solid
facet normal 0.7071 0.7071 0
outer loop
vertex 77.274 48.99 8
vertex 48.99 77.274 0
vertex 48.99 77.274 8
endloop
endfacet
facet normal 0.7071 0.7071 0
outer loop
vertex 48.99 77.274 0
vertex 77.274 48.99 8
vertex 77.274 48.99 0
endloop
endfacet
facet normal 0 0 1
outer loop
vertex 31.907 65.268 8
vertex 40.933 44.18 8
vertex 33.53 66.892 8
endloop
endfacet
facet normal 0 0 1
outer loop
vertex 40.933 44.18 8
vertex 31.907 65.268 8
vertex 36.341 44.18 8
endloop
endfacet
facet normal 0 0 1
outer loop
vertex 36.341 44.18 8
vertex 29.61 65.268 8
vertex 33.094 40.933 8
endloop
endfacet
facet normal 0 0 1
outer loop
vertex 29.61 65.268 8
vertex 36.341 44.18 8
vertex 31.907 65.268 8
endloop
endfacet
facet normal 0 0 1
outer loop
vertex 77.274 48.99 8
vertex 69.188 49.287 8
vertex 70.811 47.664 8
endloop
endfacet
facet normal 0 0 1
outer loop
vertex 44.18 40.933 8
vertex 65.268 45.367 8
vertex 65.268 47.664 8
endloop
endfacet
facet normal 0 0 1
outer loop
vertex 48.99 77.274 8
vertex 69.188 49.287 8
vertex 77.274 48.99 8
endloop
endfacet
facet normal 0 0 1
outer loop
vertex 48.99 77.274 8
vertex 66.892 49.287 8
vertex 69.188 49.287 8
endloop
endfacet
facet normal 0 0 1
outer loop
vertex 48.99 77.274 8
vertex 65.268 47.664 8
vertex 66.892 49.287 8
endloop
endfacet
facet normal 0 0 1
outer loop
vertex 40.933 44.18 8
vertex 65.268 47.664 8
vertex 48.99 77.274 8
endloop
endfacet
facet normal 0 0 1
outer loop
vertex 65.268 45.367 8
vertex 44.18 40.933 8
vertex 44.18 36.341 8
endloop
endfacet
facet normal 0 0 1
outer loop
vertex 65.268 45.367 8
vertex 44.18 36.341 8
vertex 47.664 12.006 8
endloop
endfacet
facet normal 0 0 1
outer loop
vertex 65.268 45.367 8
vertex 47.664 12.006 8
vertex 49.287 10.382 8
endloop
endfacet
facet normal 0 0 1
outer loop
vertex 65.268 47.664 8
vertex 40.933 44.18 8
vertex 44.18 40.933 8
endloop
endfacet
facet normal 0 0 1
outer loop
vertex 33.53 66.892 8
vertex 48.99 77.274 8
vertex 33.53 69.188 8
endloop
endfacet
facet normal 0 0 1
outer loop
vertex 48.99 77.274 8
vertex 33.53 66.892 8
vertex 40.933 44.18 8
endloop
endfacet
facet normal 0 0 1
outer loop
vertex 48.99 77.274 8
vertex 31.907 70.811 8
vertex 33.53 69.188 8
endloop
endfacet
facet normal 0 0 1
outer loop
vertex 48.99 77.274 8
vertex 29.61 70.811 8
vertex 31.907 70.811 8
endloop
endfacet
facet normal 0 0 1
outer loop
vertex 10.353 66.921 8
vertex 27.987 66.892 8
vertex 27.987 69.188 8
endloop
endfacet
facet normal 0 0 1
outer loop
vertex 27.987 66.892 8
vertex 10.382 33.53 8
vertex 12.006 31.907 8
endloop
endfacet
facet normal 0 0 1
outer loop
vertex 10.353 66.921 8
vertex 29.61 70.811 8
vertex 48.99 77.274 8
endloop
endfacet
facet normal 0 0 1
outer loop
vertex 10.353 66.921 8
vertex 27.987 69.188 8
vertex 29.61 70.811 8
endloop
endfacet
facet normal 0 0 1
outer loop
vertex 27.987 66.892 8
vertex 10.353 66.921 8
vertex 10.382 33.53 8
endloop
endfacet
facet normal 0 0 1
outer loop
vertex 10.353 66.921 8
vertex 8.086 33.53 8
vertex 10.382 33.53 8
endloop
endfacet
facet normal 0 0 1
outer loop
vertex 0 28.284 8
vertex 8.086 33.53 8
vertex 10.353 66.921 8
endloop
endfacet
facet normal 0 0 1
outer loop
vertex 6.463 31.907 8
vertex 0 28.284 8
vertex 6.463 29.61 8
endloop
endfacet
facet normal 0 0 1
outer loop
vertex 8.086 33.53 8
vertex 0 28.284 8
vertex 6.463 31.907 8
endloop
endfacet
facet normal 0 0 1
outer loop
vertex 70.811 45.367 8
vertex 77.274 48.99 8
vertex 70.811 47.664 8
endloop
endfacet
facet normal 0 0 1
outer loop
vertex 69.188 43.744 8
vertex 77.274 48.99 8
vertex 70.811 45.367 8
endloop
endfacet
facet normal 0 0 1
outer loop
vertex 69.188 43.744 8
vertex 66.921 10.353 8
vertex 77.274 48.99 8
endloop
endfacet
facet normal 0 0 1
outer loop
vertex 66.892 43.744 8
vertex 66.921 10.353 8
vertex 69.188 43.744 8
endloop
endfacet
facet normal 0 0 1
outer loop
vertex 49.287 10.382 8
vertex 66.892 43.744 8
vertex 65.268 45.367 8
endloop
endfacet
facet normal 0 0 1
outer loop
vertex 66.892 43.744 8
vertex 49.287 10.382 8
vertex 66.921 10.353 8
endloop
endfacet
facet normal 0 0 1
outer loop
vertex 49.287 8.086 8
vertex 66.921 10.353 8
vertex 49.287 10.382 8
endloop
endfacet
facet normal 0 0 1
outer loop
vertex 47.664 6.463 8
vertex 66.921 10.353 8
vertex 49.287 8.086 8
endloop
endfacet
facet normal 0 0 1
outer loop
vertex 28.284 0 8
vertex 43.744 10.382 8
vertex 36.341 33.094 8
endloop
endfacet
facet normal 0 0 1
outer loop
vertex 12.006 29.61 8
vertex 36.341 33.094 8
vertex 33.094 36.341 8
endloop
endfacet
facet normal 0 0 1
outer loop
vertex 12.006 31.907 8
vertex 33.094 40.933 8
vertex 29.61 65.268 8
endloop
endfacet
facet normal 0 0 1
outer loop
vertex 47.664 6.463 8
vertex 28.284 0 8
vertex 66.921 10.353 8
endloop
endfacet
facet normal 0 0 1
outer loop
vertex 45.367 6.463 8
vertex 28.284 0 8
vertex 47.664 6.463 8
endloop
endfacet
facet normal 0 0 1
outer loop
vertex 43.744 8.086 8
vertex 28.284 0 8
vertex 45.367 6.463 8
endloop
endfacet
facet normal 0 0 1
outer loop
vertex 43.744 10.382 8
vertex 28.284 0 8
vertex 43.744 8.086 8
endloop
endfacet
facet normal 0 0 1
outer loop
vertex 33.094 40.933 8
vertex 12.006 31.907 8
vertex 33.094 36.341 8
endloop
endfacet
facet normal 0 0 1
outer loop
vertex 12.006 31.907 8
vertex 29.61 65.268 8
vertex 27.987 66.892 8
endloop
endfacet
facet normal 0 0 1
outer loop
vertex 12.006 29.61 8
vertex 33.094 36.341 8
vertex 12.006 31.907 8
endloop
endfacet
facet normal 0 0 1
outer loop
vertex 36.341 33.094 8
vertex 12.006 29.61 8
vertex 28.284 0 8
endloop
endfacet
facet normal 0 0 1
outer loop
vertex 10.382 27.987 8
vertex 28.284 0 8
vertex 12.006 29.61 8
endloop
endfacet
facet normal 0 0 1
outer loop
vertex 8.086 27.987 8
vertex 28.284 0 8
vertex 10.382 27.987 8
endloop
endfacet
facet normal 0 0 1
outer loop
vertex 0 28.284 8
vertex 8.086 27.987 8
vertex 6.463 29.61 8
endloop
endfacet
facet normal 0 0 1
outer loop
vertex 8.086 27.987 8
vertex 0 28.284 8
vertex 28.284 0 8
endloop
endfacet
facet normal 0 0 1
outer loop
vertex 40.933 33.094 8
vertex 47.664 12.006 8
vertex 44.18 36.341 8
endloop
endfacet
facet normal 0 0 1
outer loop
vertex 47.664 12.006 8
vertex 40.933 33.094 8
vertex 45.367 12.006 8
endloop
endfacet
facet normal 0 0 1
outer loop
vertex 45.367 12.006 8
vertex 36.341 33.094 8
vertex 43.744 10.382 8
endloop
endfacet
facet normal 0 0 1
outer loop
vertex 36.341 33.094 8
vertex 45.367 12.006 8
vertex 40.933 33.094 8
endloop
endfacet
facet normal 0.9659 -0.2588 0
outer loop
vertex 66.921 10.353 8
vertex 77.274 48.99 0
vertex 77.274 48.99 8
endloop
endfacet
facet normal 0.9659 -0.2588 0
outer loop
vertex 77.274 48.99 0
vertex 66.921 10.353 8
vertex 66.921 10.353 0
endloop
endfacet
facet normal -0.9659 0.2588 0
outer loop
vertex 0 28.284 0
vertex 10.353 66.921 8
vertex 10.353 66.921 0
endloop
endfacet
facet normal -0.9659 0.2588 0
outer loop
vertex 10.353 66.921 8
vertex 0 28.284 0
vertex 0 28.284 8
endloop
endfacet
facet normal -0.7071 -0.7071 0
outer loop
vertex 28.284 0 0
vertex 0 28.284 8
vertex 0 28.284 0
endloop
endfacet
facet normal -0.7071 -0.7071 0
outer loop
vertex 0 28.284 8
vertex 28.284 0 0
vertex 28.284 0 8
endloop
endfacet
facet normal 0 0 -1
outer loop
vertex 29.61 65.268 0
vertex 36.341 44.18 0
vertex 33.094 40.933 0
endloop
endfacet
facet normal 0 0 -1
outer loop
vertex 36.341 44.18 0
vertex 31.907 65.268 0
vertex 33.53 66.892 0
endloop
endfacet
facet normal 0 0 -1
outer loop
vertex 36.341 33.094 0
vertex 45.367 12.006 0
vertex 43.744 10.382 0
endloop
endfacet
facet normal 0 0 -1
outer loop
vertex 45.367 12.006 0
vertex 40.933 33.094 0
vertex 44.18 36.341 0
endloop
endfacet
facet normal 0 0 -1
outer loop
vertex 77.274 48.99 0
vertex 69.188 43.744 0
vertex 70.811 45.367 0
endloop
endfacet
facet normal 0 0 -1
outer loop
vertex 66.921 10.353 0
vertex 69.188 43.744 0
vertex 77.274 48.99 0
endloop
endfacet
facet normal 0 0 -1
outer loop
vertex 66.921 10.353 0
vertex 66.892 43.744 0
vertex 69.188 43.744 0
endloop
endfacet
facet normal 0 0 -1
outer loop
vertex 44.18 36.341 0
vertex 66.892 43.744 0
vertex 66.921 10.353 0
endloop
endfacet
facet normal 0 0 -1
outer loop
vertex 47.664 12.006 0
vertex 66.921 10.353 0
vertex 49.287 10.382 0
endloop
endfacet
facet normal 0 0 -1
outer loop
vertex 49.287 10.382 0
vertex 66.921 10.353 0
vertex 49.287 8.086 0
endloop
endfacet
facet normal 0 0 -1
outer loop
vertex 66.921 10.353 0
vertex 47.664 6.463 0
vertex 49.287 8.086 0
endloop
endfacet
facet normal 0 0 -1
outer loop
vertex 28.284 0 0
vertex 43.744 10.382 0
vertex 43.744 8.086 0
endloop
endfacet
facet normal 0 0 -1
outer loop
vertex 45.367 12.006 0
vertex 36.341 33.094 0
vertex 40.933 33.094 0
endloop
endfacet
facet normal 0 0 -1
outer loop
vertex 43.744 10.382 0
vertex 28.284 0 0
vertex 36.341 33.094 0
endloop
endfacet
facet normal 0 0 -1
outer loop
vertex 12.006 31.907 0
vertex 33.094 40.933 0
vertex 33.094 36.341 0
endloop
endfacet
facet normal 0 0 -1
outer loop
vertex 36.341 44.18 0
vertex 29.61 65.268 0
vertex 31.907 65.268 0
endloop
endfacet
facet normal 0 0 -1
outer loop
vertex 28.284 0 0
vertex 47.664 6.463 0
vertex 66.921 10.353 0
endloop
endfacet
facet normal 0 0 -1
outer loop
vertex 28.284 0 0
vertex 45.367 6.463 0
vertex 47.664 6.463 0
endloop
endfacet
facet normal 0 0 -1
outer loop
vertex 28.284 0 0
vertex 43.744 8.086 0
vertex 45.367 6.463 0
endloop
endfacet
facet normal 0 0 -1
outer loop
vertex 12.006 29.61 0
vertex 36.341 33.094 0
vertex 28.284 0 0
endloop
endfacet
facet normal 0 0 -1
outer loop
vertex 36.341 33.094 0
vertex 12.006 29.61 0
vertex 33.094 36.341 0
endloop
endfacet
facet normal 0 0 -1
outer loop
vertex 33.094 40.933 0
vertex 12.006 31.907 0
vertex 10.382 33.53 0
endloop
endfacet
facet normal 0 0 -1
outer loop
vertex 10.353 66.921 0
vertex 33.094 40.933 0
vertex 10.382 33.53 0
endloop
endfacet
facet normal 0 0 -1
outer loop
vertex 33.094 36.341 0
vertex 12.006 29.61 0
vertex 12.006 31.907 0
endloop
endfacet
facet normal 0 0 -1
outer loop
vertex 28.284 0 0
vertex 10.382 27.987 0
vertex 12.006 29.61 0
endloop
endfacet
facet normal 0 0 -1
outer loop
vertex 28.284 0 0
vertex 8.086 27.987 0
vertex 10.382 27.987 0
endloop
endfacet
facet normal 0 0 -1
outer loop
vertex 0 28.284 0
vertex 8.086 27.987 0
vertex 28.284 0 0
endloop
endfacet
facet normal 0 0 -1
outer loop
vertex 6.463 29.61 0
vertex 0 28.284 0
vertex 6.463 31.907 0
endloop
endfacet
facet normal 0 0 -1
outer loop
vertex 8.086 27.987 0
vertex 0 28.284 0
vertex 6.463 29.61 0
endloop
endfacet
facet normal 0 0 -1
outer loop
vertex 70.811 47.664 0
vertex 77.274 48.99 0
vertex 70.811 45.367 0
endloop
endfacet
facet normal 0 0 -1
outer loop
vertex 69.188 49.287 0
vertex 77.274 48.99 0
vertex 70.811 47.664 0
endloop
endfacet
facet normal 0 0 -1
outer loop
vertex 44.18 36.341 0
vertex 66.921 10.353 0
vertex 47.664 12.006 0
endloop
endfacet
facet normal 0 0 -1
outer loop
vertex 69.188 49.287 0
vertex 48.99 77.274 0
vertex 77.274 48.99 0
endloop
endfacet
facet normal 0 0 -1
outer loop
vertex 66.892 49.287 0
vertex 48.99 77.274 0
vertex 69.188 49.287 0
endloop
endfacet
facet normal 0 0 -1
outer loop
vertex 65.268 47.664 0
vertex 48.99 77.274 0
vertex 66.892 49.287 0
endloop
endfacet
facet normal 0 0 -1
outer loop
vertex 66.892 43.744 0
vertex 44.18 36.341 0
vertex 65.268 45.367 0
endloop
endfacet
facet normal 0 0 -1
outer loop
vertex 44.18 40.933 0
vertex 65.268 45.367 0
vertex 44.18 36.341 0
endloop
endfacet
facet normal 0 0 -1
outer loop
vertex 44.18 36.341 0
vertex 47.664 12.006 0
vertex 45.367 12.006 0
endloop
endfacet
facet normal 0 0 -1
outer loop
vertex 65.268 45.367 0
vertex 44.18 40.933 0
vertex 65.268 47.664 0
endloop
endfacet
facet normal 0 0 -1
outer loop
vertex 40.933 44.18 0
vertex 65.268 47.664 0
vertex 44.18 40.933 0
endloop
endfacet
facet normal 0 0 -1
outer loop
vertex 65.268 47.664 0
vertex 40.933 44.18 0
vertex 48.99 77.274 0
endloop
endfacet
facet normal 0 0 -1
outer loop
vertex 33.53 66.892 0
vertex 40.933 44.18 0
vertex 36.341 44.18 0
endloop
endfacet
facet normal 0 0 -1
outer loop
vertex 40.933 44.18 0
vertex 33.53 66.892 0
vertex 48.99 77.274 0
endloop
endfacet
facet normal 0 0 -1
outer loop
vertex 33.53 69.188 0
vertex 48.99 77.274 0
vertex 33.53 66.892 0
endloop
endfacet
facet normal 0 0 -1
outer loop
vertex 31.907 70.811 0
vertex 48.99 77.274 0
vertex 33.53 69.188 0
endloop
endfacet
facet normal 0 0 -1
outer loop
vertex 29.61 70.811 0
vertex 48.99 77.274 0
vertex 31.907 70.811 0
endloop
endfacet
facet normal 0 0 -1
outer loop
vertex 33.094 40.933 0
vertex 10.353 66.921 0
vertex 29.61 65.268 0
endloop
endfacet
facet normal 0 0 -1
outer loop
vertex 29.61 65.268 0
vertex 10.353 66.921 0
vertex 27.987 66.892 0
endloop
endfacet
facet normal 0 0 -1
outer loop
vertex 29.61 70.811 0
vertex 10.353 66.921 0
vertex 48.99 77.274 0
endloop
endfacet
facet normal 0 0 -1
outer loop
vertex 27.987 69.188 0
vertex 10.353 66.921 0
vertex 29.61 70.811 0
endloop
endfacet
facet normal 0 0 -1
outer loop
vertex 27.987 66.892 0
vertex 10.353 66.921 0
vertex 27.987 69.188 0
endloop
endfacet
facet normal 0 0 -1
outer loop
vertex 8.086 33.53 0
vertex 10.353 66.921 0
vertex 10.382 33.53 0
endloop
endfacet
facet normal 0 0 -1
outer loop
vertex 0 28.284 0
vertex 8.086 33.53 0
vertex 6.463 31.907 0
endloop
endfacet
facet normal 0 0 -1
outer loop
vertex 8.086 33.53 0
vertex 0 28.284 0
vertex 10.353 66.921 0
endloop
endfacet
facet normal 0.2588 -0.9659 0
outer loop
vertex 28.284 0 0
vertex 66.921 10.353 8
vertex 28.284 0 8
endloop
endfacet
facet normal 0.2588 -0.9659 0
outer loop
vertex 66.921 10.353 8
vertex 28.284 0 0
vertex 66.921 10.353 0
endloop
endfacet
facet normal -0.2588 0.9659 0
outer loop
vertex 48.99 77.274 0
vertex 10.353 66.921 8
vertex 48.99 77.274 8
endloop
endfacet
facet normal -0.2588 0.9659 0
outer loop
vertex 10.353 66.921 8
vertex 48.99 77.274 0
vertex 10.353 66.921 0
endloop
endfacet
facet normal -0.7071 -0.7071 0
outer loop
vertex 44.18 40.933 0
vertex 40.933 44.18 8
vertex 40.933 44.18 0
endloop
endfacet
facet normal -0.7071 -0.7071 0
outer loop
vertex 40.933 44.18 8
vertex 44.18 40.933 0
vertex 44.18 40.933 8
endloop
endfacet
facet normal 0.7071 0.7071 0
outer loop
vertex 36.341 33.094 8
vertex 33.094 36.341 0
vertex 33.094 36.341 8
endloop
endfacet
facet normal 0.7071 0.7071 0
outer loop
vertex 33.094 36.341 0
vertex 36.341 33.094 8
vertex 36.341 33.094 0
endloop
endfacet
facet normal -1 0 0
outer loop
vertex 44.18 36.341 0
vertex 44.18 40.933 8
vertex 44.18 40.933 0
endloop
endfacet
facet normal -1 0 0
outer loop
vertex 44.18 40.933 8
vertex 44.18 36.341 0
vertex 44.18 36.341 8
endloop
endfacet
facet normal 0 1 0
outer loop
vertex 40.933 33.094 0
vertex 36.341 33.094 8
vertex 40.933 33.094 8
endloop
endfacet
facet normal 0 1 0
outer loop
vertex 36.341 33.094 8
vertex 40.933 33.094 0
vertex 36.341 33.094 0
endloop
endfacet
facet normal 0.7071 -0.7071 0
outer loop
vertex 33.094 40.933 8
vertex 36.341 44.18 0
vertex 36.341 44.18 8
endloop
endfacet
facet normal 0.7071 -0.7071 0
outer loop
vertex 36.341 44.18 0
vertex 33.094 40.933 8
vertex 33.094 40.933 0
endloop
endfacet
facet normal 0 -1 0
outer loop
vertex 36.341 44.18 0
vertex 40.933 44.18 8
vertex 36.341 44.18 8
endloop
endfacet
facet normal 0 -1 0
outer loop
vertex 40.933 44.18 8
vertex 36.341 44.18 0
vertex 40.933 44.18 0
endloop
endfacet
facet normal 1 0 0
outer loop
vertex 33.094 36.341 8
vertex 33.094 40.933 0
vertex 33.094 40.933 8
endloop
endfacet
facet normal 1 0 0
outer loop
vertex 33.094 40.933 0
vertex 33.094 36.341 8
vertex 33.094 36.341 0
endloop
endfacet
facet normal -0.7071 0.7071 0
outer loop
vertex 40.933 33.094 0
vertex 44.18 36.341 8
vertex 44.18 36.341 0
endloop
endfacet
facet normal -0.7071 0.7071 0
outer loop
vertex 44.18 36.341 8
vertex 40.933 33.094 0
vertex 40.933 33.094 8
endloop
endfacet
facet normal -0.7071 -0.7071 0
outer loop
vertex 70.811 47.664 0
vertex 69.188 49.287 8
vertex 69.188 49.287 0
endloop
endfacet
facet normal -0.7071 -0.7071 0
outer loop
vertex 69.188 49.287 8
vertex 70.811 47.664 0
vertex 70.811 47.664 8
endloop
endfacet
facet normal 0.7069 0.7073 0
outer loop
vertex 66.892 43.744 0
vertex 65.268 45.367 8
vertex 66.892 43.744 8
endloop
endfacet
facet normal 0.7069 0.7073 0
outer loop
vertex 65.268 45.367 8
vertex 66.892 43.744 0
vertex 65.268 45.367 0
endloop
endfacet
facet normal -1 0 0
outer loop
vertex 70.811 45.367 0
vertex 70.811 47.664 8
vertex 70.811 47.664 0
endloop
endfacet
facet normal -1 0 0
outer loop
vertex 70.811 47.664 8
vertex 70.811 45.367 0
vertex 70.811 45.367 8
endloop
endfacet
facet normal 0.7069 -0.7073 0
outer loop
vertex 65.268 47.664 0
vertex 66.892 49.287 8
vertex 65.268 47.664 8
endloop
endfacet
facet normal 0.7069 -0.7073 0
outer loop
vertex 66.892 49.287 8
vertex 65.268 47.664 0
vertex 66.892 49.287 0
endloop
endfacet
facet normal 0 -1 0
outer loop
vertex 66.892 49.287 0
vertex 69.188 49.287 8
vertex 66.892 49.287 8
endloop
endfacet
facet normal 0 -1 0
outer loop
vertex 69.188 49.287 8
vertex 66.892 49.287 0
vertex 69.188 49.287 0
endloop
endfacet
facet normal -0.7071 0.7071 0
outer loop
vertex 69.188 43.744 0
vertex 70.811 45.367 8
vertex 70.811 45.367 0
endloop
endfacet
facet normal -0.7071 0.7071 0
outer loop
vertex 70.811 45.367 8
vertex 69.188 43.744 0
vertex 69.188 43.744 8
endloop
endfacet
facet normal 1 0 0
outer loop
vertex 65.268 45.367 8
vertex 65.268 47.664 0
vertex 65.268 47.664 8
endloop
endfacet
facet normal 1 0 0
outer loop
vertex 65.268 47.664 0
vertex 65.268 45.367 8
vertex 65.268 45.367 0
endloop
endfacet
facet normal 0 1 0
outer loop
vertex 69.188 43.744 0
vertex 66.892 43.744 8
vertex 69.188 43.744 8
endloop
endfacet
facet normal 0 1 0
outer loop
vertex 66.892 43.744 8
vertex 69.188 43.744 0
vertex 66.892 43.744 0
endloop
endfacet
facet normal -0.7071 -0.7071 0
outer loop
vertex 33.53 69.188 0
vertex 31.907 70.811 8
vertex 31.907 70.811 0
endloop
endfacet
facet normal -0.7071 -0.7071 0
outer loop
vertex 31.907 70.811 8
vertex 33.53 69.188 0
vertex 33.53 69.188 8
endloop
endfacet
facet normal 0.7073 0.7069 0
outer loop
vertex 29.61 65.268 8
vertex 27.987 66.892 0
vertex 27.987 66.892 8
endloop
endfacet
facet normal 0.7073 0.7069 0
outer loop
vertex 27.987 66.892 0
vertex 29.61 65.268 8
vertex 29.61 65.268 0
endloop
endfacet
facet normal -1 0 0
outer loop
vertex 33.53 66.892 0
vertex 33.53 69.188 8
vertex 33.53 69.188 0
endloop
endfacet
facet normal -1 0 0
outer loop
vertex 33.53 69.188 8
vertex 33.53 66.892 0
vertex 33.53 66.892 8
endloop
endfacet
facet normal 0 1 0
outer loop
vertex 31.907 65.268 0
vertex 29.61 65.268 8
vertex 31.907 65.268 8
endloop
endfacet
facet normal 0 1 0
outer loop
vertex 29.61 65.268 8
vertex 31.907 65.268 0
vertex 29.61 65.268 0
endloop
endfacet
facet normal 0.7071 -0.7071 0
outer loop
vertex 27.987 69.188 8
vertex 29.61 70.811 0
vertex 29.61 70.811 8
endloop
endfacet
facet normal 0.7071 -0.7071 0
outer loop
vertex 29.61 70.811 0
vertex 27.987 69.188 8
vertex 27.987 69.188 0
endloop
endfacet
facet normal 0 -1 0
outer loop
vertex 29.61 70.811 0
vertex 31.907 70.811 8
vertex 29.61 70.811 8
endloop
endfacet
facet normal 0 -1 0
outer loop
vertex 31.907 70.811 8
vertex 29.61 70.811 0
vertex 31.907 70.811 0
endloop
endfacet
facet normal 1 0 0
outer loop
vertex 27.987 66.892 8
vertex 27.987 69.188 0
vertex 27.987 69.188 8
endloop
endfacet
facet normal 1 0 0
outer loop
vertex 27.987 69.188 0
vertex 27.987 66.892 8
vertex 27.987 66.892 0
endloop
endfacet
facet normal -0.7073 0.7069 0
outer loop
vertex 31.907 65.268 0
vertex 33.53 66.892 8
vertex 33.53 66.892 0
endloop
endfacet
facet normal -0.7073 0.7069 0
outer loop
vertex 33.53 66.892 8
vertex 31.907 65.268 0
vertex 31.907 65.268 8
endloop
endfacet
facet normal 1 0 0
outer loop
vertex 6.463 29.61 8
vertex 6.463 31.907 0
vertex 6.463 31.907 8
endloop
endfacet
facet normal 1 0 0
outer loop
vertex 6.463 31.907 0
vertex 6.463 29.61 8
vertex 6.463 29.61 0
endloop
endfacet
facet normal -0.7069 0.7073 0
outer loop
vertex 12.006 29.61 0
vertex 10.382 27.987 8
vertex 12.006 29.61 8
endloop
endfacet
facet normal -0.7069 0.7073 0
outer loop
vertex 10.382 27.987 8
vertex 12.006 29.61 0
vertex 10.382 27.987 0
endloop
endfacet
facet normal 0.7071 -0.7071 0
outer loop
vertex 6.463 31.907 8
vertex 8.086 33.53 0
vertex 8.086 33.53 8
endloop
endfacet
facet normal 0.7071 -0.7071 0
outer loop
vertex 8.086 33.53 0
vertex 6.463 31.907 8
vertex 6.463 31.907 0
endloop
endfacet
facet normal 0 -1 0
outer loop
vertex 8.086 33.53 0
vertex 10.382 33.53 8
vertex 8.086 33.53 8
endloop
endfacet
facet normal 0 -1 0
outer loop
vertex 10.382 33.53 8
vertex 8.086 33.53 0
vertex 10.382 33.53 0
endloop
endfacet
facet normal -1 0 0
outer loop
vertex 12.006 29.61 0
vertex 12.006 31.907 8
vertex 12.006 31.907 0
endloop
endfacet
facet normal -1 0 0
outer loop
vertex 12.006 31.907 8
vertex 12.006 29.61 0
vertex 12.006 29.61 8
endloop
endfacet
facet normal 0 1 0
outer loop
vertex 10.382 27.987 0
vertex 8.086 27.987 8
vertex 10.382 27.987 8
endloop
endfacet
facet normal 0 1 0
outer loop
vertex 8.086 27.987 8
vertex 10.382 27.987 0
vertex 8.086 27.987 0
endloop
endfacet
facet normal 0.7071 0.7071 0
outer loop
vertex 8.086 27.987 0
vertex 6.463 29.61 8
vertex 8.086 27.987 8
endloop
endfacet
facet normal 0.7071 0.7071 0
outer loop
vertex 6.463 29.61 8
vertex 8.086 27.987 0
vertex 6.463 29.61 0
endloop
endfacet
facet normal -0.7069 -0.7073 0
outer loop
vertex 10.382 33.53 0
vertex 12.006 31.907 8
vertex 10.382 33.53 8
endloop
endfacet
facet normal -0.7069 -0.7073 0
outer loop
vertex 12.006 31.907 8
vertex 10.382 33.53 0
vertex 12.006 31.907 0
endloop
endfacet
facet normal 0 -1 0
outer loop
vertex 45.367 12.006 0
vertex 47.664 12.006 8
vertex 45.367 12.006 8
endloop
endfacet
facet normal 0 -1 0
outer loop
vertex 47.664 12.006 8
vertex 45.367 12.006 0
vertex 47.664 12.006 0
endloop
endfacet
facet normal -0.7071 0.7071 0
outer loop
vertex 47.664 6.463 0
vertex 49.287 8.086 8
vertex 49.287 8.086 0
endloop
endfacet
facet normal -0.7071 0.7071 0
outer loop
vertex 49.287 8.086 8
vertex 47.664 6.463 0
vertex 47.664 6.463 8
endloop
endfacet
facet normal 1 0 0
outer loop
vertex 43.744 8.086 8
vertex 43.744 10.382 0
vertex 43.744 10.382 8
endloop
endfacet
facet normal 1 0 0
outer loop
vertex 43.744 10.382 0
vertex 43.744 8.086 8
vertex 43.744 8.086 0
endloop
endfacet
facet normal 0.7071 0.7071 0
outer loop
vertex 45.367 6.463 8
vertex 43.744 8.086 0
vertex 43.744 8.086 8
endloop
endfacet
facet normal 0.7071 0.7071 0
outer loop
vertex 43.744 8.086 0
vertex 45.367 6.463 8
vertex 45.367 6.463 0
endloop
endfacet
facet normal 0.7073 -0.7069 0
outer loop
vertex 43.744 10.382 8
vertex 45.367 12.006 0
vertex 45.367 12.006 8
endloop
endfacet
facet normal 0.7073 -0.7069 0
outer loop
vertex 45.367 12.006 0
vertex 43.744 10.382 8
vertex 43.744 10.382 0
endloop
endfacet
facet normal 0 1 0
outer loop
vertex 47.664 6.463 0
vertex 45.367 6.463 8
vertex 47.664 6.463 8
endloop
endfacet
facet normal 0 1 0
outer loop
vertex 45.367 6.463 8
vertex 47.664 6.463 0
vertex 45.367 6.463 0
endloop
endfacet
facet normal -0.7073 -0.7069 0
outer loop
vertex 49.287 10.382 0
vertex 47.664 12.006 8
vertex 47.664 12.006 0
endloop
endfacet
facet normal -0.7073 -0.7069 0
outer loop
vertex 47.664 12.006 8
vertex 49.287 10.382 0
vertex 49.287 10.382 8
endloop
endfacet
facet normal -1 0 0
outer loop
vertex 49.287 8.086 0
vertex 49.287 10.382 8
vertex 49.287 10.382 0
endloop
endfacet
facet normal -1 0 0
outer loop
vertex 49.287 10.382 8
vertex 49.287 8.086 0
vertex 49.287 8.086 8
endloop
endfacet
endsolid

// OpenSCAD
$fn = 32;

// ----------------------------------------------------------------------
// Polygon plate: 6-gon R40, 4 bolt windows
// ----------------------------------------------------------------------

// --- parameters (mm) ---
sides = 6;                // number of polygon sides
plate_r = 40;             // circumscribed radius of the polygon
bore_r = 6;               // centre bore radius
bolts = 4;                // number of bolt windows
ring_r = 30.44;           // bolt-circle radius
bolt_r = 3;               // bolt window radius
plate_t = 8;              // plate thickness, Z (extrusion height)
fit_tol = 0.1;            // declared fit tolerance (prompt contract)
free_tol = 0.5;           // declared free tolerance (prompt contract)

plate_d = 2 * plate_r;  // circumscribed diameter
bore_d = 2 * bore_r;  // centre bore diameter
bolt_d = 2 * bolt_r;  // bolt window diameter
ring_d = 2 * ring_r;  // bolt-circle diameter

profile = [[77.274, 48.99], [48.99, 77.274], [10.353, 66.921], [0, 28.284], [28.284, 0], [66.921, 10.353]];  // primary outline, 6 points, counter clockwise
void_1 = [[44.18, 40.933], [40.933, 44.18], [36.341, 44.18], [33.094, 40.933], [33.094, 36.341], [36.341, 33.094], [40.933, 33.094], [44.18, 36.341]];  // centre bore, 8 points
void_2 = [[70.811, 47.664], [69.188, 49.287], [66.892, 49.287], [65.268, 47.664], [65.268, 45.367], [66.892, 43.744], [69.188, 43.744], [70.811, 45.367]];  // bolt window 1, 8 points
void_3 = [[33.53, 69.188], [31.907, 70.811], [29.61, 70.811], [27.987, 69.188], [27.987, 66.892], [29.61, 65.268], [31.907, 65.268], [33.53, 66.892]];  // bolt window 2, 8 points
void_4 = [[12.006, 31.907], [10.382, 33.53], [8.086, 33.53], [6.463, 31.907], [6.463, 29.61], [8.086, 27.987], [10.382, 27.987], [12.006, 29.61]];  // bolt window 3, 8 points
void_5 = [[49.287, 10.382], [47.664, 12.006], [45.367, 12.006], [43.744, 10.382], [43.744, 8.086], [45.367, 6.463], [47.664, 6.463], [49.287, 8.086]];  // bolt window 4, 8 points

// --- the one profile operation ---
difference() {
  linear_extrude(height = plate_t) polygon(points = profile);
  translate([0, 0, -1])
    linear_extrude(height = plate_t + 2) polygon(points = void_1);
  translate([0, 0, -1])
    linear_extrude(height = plate_t + 2) polygon(points = void_2);
  translate([0, 0, -1])
    linear_extrude(height = plate_t + 2) polygon(points = void_3);
  translate([0, 0, -1])
    linear_extrude(height = plate_t + 2) polygon(points = void_4);
  translate([0, 0, -1])
    linear_extrude(height = plate_t + 2) polygon(points = void_5);
}
